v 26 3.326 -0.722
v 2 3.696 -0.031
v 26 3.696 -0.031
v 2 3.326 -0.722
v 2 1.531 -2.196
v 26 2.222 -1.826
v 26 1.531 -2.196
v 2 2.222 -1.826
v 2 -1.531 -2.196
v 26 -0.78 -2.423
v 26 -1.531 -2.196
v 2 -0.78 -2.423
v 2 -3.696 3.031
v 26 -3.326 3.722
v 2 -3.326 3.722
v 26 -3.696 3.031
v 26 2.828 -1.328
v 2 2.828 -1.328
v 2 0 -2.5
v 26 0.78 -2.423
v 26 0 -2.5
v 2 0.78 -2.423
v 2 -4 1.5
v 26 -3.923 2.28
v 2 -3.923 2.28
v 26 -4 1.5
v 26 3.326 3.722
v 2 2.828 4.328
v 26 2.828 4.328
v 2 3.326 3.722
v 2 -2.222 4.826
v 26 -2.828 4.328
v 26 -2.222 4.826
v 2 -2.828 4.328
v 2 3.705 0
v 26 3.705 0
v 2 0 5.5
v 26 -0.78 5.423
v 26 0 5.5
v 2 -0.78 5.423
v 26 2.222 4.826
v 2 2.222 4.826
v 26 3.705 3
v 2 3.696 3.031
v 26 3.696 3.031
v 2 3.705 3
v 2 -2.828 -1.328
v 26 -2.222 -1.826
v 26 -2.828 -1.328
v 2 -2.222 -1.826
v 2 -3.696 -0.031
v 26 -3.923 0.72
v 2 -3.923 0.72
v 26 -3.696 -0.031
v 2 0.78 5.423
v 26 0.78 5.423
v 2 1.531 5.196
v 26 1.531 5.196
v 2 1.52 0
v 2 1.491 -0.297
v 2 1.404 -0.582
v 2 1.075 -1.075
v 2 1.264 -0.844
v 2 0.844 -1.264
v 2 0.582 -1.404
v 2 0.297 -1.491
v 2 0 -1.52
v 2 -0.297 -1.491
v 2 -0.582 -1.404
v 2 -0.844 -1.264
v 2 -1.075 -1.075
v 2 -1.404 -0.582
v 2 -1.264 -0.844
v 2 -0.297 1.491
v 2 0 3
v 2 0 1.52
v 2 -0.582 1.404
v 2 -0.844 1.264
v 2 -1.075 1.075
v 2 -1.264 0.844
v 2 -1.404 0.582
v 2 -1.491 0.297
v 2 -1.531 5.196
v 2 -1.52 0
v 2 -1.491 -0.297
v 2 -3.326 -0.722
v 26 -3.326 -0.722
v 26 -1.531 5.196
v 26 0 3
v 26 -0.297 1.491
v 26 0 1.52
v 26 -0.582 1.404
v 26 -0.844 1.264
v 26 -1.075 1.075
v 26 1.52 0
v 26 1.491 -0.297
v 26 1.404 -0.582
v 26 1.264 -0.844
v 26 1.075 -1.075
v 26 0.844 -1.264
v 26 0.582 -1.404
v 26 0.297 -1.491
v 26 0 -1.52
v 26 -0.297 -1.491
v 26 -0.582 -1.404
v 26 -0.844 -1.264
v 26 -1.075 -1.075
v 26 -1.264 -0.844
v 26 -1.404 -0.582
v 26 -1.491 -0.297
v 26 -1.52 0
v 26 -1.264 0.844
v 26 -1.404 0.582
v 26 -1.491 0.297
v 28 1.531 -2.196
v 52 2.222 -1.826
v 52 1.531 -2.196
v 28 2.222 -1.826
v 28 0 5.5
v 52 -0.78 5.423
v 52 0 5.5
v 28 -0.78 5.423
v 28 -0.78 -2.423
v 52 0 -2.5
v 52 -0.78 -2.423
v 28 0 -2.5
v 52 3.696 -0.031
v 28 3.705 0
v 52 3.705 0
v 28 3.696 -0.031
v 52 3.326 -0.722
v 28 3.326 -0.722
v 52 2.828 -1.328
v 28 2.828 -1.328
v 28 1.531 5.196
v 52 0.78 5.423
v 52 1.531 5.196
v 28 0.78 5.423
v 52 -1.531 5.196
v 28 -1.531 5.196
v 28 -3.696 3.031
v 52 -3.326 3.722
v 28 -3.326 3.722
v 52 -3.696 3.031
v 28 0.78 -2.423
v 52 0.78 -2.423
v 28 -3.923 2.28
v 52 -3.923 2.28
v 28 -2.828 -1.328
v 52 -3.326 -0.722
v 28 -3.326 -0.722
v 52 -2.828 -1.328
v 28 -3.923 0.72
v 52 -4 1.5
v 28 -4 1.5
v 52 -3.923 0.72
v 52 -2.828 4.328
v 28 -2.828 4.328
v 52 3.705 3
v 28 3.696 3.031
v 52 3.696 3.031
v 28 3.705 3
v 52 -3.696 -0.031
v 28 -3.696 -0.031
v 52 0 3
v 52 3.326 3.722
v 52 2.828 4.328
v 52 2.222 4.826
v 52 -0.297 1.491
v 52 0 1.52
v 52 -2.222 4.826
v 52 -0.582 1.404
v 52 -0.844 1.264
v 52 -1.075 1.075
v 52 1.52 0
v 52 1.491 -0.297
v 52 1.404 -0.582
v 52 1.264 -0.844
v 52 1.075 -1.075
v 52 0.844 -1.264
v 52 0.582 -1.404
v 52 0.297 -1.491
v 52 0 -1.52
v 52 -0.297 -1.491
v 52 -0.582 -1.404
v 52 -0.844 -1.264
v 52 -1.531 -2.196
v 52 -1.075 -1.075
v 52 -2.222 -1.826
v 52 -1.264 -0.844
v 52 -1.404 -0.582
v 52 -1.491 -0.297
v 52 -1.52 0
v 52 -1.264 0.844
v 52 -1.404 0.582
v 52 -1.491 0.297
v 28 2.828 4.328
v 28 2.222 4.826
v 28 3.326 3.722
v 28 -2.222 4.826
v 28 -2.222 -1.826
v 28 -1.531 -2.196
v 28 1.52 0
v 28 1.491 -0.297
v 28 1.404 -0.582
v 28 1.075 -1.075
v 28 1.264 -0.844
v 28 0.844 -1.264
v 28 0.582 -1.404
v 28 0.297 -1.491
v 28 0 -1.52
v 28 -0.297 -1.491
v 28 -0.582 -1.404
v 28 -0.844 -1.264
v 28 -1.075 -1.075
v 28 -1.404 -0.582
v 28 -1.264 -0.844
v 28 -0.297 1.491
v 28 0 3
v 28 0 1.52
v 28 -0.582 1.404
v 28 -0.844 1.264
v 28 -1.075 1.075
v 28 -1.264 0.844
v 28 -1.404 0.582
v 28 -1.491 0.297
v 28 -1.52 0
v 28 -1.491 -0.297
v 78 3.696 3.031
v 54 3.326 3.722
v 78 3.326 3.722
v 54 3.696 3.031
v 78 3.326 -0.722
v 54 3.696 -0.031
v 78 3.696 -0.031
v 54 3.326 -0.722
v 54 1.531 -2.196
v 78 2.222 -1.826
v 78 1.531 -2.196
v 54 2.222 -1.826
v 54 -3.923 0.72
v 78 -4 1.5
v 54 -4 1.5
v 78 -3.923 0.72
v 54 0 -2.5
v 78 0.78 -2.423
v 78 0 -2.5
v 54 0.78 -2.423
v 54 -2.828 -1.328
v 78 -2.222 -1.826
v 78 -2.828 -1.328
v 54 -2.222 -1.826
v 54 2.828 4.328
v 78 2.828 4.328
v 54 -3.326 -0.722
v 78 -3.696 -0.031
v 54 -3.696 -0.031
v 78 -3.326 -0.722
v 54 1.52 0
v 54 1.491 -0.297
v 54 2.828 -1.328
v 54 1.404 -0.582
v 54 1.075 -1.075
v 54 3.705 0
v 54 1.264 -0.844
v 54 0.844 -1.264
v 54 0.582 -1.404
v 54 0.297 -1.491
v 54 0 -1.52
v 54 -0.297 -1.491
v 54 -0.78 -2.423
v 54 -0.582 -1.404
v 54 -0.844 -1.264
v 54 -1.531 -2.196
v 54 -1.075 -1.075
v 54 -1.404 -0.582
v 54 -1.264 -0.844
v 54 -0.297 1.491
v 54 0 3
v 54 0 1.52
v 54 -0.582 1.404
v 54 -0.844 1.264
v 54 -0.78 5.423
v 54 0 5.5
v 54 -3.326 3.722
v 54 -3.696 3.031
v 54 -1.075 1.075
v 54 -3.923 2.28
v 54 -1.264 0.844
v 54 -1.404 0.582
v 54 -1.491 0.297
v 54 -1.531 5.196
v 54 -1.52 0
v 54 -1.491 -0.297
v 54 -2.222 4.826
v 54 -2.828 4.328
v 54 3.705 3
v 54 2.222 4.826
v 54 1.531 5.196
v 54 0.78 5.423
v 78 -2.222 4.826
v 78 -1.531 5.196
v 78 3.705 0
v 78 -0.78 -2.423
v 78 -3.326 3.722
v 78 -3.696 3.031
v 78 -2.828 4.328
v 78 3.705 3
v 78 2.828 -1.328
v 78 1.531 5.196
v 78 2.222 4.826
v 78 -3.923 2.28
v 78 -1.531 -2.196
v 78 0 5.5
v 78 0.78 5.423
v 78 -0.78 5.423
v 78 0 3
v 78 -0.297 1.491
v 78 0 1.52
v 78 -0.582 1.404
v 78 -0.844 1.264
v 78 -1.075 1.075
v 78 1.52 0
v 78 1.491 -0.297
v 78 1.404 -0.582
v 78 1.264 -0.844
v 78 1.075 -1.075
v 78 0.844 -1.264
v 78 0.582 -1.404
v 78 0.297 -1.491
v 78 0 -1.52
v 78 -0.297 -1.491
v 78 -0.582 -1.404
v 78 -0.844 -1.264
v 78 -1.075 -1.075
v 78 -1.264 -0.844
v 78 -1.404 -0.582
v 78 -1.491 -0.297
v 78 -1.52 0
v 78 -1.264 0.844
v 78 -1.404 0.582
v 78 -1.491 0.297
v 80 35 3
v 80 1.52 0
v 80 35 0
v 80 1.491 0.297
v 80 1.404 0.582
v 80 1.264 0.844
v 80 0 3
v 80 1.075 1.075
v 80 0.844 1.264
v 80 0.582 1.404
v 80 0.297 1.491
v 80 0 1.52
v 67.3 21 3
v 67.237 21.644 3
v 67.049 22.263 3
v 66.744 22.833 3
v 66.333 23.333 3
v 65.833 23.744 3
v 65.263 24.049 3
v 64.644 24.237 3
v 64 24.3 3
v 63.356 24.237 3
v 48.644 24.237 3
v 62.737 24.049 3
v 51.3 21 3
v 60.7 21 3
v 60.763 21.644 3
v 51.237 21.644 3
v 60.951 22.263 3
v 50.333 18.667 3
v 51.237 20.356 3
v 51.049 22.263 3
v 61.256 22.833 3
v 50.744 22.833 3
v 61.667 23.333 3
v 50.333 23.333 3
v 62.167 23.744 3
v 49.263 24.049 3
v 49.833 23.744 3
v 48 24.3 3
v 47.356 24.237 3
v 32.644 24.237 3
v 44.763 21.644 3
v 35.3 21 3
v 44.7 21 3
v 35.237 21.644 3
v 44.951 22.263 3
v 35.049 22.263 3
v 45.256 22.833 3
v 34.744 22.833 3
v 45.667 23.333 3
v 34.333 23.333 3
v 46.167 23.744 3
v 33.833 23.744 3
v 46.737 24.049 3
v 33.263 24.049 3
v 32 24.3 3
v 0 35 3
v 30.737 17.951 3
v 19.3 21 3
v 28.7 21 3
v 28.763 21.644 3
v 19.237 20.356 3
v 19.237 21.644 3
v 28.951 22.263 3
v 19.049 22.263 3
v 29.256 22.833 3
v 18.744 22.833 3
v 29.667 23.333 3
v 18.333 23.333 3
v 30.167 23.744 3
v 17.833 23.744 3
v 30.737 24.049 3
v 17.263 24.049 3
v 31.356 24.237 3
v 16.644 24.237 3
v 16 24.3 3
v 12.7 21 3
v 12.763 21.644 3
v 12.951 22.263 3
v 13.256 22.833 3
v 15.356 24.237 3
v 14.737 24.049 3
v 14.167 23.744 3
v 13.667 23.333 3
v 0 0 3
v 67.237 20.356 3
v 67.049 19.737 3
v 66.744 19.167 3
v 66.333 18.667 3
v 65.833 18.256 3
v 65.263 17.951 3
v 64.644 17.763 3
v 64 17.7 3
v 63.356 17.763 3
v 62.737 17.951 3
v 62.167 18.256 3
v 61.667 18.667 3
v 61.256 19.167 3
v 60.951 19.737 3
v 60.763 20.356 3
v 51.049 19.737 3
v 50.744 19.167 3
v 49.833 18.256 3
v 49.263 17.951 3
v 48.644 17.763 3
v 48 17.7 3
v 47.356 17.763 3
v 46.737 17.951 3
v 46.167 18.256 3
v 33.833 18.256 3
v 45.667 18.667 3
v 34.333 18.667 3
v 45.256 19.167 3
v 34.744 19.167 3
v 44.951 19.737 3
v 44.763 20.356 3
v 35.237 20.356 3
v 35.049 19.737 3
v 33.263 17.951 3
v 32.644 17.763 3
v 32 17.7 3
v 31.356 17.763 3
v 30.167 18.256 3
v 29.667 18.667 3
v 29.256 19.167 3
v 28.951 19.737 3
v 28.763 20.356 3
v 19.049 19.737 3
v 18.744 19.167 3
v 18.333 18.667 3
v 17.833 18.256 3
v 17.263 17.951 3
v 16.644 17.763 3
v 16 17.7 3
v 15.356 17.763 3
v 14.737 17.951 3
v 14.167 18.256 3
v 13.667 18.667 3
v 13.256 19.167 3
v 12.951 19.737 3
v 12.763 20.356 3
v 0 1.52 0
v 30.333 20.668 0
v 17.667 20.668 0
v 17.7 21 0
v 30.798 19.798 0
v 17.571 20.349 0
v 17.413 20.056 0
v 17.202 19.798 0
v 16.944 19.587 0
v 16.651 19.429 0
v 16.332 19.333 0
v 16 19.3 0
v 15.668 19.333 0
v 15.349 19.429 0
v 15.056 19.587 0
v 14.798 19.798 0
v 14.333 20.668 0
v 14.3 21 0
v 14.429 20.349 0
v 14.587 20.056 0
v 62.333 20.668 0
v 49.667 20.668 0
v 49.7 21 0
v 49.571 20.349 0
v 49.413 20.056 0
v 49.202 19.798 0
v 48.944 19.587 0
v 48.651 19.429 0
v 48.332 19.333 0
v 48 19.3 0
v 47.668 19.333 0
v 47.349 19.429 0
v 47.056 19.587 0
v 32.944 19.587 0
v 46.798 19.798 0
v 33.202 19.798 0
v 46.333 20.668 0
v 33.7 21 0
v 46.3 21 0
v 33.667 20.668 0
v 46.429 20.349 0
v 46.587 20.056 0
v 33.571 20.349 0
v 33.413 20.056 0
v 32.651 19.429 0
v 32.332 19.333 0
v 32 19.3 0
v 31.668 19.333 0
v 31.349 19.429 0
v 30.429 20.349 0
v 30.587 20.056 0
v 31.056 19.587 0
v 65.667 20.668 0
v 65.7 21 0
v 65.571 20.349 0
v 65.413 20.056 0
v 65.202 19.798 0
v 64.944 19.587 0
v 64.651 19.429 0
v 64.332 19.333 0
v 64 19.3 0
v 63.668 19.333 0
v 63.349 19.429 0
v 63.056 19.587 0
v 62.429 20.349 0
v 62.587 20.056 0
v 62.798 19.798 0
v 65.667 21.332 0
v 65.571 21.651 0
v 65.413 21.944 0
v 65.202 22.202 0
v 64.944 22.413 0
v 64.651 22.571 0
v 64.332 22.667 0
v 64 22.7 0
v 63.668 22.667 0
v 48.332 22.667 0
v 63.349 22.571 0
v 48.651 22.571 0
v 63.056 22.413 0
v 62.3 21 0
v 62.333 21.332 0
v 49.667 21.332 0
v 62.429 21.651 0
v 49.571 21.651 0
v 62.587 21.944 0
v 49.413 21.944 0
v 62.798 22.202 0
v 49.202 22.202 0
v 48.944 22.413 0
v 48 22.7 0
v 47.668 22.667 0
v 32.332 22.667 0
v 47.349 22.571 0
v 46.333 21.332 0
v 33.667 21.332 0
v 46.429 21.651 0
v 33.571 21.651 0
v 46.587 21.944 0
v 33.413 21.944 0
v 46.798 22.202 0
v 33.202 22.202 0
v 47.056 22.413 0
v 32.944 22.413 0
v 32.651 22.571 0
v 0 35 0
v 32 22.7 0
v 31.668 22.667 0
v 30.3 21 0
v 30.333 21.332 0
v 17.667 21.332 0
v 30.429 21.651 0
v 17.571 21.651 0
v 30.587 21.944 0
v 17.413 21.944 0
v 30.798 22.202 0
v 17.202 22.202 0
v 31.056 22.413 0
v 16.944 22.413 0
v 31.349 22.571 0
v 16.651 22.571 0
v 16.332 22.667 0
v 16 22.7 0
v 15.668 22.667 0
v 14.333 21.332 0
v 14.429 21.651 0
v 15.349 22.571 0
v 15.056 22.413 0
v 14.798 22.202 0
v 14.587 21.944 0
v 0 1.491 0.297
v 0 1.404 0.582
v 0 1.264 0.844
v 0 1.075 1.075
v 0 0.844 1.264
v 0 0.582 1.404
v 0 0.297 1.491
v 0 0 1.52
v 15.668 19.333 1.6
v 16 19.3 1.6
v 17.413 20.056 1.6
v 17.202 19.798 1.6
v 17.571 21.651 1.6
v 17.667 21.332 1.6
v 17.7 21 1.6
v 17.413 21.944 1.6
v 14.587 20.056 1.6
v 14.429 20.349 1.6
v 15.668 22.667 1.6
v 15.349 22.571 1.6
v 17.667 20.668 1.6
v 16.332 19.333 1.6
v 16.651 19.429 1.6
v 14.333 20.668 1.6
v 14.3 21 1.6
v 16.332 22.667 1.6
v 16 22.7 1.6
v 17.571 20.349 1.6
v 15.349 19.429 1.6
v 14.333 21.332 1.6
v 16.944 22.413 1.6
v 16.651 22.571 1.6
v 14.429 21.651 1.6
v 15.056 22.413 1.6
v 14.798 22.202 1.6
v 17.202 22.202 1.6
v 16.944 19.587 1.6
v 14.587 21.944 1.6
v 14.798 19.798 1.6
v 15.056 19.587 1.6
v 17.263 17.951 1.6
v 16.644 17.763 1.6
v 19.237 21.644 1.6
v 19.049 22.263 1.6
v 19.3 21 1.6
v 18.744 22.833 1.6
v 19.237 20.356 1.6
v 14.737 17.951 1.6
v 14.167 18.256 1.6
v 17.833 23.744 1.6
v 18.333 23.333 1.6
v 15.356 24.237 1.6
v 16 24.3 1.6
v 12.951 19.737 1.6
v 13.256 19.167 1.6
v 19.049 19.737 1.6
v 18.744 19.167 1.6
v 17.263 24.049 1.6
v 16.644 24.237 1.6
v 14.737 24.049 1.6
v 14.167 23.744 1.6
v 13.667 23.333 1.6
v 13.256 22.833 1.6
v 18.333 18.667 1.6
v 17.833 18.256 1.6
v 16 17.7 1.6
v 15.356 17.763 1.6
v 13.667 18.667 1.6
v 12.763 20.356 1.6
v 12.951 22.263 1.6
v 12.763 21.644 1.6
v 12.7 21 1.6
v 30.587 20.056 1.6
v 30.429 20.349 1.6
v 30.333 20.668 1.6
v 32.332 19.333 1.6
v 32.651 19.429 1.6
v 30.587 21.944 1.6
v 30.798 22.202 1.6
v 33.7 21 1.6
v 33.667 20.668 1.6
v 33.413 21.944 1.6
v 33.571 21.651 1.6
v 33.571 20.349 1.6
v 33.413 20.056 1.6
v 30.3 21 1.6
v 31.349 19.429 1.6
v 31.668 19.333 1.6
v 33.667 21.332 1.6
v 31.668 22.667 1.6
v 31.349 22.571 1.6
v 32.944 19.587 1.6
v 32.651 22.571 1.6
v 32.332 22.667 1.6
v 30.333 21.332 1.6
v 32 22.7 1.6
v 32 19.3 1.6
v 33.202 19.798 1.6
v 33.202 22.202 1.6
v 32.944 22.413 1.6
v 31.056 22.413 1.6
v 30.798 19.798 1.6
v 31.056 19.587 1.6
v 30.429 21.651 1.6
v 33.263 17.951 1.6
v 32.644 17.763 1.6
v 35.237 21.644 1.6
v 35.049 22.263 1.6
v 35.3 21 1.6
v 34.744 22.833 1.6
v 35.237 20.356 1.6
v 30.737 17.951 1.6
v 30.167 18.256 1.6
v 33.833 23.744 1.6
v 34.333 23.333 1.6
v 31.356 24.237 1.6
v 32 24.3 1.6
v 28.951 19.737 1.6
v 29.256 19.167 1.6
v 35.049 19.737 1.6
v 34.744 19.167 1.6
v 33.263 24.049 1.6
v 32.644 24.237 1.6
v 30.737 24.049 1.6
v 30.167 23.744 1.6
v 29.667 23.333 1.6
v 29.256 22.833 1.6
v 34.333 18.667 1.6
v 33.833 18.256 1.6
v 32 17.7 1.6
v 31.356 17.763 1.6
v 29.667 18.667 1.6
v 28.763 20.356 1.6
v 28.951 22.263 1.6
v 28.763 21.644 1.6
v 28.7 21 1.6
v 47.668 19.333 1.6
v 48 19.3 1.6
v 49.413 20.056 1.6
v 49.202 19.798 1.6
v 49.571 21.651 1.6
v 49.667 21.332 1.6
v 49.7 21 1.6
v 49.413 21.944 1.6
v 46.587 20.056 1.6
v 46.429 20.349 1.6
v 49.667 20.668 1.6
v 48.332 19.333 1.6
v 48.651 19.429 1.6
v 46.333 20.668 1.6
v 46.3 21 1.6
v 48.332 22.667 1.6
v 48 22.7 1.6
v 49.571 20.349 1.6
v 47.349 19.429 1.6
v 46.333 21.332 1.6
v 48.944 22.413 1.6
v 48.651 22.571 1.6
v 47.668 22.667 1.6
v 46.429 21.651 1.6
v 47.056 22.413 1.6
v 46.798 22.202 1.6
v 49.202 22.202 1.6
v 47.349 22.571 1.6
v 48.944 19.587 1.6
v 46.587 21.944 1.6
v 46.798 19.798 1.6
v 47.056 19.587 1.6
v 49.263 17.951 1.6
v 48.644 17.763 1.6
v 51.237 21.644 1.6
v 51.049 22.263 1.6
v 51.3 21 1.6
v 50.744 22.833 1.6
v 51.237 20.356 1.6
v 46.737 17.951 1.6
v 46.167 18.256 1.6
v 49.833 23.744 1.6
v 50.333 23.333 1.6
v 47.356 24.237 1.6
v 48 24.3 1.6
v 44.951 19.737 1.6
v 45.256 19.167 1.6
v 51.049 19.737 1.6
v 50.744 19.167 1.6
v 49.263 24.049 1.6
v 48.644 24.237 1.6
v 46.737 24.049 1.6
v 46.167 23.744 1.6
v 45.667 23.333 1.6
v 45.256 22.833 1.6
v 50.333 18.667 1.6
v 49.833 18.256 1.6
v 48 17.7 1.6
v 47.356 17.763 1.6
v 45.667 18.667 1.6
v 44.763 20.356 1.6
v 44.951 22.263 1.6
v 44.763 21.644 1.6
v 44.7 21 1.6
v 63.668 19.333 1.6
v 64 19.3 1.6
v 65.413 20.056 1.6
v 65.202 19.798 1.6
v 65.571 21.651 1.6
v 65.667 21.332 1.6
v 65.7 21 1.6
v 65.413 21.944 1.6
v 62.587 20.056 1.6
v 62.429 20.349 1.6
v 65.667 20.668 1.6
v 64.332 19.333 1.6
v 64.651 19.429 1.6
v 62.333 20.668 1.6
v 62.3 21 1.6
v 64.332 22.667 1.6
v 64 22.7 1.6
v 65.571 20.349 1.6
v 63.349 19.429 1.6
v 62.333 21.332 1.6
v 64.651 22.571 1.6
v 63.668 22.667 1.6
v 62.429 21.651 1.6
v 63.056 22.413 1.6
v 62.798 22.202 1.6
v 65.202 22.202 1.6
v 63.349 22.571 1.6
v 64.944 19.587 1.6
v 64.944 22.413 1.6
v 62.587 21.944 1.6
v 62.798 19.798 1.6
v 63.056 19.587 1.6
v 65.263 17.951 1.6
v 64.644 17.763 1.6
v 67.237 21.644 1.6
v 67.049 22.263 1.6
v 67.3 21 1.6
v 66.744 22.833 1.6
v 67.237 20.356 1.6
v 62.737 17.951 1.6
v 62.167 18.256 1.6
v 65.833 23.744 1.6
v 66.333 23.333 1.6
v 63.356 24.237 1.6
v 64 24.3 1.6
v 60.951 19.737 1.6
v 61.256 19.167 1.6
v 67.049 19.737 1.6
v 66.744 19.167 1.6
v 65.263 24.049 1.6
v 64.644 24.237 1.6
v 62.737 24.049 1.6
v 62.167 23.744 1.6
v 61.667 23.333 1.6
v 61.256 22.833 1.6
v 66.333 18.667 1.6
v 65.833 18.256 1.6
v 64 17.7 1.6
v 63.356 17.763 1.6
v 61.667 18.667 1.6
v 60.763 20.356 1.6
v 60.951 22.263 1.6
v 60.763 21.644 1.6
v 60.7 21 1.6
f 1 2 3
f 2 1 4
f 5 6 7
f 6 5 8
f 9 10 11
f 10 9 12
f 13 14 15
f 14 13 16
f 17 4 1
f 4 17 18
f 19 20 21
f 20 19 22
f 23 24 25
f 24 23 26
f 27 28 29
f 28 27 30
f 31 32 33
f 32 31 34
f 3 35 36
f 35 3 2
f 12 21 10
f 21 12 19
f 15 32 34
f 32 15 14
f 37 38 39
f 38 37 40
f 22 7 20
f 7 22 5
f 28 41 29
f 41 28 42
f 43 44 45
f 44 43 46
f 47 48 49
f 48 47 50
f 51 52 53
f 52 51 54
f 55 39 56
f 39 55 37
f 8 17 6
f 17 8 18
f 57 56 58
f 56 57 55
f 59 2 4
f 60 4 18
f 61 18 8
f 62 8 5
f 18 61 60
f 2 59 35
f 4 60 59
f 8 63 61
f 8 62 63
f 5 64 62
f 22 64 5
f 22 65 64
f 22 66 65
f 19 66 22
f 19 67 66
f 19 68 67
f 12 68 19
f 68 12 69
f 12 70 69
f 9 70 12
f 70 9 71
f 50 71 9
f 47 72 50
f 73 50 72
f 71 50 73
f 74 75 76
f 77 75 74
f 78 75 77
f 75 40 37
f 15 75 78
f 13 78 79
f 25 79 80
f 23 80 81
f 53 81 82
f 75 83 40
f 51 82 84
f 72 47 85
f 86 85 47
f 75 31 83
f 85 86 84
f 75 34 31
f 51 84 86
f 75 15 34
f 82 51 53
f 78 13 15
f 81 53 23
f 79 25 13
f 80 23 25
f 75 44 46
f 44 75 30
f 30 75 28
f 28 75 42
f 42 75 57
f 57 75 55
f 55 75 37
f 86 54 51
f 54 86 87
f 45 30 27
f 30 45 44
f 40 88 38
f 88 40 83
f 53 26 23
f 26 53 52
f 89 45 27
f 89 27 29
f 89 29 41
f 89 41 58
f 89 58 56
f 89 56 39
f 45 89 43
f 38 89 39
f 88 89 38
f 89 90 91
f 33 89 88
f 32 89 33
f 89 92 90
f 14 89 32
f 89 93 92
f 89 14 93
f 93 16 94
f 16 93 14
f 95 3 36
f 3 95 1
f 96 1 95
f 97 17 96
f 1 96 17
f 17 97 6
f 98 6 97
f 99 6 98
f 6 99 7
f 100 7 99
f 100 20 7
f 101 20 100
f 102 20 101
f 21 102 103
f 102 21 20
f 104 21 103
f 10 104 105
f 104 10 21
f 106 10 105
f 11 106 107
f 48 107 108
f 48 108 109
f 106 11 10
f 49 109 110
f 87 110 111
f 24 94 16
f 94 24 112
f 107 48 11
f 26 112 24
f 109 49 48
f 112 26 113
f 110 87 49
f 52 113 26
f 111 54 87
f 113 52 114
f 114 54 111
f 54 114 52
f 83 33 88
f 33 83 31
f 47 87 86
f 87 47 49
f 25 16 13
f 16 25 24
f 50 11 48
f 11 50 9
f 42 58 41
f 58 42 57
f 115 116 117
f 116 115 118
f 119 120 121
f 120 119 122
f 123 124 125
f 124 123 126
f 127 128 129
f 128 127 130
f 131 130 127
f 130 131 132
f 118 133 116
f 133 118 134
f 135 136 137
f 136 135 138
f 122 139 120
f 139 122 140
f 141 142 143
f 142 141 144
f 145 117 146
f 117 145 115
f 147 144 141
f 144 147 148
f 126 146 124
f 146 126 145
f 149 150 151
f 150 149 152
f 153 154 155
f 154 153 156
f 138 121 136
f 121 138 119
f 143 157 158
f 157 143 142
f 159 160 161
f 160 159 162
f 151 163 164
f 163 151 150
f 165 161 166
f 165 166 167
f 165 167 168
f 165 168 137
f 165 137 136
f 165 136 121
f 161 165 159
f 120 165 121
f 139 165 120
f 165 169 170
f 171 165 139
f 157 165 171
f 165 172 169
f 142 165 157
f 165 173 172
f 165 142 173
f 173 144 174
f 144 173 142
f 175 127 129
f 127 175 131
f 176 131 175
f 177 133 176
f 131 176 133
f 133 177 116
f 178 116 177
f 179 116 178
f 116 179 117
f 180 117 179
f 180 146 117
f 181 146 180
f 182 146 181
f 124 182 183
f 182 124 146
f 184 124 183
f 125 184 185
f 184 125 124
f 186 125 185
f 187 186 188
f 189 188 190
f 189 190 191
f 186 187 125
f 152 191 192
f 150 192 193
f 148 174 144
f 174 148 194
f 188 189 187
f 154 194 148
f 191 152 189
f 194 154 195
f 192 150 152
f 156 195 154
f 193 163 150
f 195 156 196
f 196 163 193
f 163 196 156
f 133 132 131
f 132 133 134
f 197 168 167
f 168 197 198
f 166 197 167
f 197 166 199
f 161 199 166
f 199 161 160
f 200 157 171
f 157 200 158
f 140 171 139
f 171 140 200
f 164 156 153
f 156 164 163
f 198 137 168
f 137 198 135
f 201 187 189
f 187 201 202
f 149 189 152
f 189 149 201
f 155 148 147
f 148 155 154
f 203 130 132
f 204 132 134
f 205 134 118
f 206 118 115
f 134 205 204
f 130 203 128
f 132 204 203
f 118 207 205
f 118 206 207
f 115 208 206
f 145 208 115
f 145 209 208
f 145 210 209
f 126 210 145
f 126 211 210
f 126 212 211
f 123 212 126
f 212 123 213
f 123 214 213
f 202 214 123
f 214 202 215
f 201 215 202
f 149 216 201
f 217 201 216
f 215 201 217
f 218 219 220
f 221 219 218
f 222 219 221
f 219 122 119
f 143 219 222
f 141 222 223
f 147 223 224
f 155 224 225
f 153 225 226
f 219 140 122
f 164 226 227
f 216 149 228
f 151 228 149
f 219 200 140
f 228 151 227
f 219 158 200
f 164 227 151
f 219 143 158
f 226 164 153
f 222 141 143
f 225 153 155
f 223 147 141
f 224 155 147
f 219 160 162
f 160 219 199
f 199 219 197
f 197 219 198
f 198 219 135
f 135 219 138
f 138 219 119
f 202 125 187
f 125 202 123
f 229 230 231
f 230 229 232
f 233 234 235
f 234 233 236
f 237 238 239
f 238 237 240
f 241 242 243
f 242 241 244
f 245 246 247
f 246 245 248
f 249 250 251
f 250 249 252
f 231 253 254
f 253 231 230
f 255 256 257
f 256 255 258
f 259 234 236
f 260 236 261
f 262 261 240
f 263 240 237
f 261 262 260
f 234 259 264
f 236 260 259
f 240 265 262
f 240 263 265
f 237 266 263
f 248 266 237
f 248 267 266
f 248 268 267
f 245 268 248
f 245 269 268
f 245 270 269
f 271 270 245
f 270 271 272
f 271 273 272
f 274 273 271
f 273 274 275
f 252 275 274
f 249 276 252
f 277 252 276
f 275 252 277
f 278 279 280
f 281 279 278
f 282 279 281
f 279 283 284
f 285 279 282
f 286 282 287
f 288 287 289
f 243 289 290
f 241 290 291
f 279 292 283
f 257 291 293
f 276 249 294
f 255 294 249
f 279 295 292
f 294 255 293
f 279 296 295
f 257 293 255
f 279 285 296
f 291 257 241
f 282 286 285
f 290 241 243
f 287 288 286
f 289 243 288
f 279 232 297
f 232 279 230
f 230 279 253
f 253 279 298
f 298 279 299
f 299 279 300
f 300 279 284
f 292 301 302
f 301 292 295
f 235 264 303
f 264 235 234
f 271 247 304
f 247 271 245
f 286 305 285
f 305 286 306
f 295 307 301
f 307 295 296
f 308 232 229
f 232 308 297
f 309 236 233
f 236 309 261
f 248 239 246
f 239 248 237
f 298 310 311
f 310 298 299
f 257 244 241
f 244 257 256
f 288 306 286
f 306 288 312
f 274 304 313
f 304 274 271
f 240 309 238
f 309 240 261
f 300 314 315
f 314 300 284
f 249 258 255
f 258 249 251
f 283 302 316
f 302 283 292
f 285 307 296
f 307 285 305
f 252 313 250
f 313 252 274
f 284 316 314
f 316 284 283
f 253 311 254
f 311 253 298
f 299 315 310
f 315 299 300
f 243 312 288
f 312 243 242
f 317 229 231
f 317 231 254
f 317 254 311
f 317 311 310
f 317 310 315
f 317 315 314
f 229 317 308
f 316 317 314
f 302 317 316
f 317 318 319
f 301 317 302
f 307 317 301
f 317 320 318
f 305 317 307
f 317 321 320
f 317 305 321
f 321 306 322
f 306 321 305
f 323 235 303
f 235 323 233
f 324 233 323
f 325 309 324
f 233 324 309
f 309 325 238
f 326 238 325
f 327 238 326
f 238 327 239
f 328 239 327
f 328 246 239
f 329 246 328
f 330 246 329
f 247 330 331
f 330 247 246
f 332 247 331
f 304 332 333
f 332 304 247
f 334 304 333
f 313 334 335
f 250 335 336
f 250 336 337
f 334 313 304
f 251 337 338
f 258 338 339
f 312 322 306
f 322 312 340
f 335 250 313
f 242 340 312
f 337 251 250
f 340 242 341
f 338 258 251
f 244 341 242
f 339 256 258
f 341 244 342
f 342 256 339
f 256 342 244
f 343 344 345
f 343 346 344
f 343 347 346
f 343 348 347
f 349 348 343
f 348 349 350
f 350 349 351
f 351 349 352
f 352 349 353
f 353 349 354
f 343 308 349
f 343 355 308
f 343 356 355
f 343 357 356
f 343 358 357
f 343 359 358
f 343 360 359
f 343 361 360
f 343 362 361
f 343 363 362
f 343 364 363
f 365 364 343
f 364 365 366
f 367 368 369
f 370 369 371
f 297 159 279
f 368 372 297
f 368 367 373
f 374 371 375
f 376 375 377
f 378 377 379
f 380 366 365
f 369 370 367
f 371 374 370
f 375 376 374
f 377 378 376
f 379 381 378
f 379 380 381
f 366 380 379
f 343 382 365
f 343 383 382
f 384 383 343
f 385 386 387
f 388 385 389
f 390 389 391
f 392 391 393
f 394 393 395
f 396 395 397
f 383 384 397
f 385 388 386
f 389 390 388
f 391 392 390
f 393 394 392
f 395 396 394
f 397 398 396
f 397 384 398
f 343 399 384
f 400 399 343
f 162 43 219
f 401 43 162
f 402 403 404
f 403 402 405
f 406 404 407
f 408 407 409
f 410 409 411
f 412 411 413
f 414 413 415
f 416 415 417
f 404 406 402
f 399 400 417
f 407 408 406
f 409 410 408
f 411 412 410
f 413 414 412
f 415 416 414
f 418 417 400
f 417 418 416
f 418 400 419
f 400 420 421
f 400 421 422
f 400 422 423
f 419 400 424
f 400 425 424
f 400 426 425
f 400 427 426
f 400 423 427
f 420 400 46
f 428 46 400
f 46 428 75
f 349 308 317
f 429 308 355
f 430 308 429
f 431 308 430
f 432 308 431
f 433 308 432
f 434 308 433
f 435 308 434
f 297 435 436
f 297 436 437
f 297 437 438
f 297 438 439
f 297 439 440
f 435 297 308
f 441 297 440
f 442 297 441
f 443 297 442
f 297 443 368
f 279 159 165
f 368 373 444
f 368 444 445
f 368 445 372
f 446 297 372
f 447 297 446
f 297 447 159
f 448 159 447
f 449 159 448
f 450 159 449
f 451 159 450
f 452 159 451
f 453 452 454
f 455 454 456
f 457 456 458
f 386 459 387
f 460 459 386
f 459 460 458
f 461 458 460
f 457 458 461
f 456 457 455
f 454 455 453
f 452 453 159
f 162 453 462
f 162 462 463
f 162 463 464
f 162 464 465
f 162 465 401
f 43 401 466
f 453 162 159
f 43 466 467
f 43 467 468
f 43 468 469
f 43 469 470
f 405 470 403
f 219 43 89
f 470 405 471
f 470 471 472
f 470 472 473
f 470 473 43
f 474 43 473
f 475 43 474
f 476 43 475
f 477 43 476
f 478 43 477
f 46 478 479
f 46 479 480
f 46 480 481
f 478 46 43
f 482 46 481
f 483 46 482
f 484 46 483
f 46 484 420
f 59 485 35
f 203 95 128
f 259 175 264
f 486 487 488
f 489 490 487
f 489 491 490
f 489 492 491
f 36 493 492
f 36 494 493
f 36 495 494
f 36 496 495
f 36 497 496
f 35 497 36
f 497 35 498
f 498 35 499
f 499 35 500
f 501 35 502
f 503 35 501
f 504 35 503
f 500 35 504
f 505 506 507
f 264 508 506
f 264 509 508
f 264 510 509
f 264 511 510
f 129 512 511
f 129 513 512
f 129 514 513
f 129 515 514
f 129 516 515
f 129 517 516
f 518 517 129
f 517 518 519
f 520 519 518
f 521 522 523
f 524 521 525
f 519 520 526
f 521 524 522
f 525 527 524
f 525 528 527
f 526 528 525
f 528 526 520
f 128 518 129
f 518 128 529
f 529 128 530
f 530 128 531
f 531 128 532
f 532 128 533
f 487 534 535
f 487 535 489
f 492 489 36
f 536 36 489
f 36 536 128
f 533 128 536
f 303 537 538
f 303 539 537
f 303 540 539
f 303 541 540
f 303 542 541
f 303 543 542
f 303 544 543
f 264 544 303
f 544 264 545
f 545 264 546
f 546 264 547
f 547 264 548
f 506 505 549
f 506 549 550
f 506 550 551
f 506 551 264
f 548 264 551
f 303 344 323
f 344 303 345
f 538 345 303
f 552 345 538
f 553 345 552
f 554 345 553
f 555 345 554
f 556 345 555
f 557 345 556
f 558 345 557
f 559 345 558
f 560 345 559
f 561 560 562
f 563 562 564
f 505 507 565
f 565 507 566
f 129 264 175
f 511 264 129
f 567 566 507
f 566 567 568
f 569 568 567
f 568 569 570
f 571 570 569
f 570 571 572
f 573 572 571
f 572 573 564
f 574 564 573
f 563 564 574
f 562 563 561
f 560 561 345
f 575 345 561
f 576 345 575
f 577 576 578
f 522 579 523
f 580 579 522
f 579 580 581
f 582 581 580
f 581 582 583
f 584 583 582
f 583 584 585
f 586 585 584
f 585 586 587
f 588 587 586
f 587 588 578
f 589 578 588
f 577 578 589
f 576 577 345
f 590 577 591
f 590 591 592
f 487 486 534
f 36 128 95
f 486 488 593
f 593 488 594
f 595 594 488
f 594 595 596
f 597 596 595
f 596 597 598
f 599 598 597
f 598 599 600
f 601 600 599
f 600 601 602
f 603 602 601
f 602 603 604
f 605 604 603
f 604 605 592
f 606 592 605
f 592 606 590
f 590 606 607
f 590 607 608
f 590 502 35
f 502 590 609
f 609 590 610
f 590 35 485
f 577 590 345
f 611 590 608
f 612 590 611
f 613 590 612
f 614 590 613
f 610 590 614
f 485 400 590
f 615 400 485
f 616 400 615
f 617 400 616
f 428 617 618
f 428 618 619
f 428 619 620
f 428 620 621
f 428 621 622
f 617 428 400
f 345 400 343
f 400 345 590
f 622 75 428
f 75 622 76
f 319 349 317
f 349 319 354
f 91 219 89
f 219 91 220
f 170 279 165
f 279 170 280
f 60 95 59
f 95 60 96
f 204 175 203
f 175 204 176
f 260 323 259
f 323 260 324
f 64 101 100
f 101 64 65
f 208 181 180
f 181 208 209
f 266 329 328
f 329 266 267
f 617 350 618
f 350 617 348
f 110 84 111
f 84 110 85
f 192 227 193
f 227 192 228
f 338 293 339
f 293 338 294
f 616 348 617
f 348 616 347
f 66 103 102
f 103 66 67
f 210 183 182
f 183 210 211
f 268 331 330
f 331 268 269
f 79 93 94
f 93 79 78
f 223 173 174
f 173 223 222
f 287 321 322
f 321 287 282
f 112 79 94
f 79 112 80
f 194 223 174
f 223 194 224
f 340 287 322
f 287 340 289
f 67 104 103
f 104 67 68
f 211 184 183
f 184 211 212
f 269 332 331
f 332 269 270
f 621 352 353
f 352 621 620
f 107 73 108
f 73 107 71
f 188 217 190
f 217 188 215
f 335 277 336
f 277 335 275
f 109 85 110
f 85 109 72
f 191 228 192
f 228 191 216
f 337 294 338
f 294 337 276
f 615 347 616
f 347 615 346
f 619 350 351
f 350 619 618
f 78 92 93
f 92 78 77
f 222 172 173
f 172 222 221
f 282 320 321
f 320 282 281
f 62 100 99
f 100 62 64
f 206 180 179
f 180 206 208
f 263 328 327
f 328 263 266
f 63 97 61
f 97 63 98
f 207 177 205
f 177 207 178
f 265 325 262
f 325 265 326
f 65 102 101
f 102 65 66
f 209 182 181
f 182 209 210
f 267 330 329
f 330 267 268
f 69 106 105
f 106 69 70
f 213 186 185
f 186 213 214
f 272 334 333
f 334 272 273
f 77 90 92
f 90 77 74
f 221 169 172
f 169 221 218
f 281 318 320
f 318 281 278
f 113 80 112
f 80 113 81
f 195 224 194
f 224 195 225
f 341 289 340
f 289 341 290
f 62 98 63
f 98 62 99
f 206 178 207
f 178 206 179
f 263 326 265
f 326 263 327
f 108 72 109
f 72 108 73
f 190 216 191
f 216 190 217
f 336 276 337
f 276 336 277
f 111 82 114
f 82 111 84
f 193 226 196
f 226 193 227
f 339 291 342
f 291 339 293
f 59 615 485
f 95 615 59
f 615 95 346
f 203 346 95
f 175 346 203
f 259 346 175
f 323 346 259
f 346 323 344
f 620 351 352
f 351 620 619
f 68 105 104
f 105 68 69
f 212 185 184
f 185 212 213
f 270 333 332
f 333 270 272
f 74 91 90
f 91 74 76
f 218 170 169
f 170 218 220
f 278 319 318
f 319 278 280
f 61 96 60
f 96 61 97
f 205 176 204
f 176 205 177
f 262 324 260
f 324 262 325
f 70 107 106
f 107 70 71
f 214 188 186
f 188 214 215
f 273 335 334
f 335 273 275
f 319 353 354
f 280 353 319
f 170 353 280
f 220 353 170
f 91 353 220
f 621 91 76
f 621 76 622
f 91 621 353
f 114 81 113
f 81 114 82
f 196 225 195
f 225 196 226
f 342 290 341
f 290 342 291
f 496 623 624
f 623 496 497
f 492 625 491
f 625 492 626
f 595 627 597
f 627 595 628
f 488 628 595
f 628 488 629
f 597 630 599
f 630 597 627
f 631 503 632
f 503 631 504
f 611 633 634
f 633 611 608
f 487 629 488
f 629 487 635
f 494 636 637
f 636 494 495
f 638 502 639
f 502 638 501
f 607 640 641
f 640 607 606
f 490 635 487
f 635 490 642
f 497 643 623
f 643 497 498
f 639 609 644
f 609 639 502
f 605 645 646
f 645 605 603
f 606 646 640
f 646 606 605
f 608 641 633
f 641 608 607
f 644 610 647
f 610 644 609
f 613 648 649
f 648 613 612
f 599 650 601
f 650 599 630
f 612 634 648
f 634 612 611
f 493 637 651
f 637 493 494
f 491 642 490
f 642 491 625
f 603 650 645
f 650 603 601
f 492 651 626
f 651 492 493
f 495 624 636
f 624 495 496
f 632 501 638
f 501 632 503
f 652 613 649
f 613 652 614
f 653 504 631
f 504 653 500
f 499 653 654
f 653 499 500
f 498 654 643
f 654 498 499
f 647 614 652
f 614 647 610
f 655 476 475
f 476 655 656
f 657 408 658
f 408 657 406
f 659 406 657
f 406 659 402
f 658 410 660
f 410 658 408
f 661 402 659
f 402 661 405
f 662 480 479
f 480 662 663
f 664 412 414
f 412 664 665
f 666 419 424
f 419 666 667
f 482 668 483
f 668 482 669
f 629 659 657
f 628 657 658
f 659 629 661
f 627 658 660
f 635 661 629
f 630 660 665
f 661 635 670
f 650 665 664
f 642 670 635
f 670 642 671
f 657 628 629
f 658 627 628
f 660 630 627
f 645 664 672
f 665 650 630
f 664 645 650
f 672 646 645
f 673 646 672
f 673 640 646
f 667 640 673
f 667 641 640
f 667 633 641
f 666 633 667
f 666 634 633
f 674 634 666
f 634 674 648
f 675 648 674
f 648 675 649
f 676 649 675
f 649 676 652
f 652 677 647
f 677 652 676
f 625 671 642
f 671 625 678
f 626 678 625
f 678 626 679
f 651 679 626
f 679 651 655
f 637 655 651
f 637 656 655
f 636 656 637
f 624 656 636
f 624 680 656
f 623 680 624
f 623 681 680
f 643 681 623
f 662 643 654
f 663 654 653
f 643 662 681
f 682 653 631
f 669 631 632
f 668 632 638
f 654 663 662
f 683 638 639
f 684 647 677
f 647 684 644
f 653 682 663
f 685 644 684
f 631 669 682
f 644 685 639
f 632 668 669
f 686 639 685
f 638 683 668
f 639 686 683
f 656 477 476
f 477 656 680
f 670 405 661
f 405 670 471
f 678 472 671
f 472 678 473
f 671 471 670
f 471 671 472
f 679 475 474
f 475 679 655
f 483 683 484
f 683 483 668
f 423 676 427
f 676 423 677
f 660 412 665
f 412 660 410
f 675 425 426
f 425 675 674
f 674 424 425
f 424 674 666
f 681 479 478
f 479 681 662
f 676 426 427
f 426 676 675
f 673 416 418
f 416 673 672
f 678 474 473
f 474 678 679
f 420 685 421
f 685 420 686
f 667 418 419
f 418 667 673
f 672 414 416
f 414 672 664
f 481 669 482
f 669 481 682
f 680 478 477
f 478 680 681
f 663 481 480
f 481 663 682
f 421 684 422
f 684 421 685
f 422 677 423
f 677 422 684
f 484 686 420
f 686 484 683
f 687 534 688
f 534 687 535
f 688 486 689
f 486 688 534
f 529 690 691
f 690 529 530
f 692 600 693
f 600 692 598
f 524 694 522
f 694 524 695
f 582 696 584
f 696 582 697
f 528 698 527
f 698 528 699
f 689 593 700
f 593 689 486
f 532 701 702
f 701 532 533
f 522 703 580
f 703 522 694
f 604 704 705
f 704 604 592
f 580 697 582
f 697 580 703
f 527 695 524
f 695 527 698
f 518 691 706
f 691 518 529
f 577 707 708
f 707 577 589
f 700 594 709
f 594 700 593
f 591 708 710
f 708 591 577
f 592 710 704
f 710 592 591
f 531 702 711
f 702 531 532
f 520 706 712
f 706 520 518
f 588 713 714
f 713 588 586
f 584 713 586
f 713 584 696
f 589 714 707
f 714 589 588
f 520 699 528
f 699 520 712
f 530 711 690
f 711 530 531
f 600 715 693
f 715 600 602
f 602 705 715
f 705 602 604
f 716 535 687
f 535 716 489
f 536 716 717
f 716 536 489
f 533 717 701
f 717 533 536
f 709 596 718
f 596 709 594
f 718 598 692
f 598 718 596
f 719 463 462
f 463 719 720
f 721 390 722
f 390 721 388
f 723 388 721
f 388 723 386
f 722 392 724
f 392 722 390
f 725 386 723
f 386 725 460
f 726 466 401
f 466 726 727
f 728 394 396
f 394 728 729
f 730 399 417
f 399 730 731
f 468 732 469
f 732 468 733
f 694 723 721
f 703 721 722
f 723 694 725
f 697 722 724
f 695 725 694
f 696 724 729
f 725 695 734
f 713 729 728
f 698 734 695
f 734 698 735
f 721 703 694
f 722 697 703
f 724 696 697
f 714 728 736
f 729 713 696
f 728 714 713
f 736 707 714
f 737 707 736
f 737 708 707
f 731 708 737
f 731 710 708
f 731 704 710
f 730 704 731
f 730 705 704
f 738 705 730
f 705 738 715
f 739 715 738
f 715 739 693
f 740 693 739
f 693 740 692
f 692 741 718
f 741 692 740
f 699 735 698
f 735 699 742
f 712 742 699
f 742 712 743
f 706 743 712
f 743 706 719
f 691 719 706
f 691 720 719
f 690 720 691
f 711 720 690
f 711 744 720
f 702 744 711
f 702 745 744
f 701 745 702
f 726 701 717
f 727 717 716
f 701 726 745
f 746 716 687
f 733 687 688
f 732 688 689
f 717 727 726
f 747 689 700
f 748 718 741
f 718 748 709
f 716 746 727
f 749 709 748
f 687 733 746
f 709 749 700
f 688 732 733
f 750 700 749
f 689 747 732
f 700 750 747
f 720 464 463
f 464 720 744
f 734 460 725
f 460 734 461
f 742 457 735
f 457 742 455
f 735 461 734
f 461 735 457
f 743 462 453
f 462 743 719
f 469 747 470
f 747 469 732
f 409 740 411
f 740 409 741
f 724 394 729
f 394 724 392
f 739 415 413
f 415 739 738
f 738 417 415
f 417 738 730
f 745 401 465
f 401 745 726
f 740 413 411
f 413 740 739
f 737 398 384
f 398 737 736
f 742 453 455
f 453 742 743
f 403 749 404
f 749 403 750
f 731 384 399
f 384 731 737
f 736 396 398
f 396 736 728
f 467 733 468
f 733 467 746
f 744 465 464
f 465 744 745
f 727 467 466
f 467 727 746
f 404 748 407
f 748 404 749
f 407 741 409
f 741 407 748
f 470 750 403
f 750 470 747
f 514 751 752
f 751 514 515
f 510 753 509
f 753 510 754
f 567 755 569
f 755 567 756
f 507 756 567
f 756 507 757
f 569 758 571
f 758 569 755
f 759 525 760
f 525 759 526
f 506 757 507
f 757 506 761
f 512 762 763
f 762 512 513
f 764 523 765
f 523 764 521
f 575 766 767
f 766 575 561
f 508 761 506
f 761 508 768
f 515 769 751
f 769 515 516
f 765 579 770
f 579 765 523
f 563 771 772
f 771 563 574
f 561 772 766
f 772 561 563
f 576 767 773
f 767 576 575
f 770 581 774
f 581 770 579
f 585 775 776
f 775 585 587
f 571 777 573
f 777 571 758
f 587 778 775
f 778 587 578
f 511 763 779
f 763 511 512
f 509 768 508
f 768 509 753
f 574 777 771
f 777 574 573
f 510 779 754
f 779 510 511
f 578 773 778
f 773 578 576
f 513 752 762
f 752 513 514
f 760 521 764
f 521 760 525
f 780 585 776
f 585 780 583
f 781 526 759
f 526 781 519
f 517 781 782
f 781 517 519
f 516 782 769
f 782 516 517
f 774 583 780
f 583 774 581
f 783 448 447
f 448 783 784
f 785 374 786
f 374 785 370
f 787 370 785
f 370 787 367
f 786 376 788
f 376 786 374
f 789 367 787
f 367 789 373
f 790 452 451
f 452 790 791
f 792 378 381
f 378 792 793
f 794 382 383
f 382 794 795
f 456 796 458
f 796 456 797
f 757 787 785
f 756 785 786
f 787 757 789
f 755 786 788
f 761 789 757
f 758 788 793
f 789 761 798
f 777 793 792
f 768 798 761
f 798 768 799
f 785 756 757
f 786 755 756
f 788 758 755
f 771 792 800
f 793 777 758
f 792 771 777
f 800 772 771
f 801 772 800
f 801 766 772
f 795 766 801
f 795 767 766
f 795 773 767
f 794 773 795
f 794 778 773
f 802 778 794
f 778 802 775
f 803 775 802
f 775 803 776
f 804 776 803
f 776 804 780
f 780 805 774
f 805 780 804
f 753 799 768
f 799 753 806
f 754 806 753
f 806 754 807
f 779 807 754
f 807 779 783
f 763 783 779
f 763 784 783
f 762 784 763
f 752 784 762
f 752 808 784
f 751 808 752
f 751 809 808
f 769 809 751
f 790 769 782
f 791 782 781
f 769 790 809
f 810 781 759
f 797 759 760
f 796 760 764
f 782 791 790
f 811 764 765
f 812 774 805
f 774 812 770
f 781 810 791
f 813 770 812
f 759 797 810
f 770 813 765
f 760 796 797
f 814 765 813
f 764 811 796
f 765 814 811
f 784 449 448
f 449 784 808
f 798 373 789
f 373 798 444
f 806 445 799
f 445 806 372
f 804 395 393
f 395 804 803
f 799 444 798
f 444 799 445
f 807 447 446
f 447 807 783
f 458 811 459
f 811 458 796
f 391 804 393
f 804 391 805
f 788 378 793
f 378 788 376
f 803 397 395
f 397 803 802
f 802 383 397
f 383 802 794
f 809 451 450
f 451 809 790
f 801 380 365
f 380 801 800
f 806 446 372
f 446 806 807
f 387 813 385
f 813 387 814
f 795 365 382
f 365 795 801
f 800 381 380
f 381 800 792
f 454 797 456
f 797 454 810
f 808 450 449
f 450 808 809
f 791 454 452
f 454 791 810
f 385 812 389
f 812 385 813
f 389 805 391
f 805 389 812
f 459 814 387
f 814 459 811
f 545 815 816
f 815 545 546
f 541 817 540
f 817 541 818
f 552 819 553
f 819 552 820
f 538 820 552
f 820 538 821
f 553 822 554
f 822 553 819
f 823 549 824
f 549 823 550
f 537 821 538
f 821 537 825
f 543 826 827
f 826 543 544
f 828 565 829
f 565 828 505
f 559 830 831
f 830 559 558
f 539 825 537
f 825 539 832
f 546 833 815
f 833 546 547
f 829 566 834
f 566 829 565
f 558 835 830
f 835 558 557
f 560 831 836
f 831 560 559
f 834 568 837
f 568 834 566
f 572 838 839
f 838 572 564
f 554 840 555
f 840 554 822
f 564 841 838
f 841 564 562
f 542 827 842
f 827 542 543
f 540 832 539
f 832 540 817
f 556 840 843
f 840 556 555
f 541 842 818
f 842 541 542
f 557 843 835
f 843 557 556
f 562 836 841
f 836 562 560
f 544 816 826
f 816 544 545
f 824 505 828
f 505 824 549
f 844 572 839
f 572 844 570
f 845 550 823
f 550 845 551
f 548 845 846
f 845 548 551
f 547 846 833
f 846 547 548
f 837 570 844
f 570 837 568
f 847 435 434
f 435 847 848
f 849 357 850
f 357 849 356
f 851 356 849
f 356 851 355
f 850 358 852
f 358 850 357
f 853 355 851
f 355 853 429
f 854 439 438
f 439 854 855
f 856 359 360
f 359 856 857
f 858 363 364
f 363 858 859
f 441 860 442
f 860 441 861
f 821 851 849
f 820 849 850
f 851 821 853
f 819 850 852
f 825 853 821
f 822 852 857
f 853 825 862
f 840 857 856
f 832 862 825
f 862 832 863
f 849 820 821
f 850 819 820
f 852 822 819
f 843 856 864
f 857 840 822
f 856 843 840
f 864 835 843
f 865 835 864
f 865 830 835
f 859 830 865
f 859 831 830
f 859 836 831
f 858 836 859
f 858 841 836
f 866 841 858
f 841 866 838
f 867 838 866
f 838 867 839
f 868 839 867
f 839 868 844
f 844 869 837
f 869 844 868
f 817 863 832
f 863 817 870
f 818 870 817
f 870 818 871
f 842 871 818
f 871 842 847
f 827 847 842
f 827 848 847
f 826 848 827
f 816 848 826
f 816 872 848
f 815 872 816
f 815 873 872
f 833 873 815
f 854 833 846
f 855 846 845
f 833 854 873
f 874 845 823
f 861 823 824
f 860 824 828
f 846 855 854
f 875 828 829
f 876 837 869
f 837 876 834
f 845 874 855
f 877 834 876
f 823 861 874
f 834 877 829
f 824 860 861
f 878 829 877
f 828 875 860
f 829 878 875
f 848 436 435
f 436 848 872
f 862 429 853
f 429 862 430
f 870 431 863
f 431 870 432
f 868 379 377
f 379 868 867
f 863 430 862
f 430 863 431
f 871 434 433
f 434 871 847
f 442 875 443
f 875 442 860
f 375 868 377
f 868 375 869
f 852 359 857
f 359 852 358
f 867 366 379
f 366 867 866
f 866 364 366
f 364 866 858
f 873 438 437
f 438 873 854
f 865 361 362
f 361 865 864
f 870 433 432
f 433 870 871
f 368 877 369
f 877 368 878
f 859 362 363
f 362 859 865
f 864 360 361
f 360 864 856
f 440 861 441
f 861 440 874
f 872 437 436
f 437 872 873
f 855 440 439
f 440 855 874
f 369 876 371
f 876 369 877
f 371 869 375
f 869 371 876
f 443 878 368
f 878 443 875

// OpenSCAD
$fn = 32;

// ----------------------------------------------------------------------
// Hinge leaf: 80 x 39 x 8 mm
// ----------------------------------------------------------------------

// --- parameters (mm) ---
leaf_len = 80;            // leaf length, X
leaf_w = 35;              // leaf width, Y
leaf_t = 3;               // leaf thickness
knuckle_d = 8;            // knuckle diameter
knuckle_w = 24;           // knuckle width
knuckle_n = 3;            // number of knuckles
pin_d = 3.04;             // pin bore
gap = 2;                  // gap between the knuckles
screw_d = 3.4;            // screw clearance
cs_d = 6.6;               // countersink diameter
cs_h = 1.4;               // countersink depth

module leaf() {
  cube([leaf_len, leaf_w, leaf_t]);
}

module knuckles() {
  /* barrels sit on the leaf edge, the pin axis at half the leaf thickness */
  for (i = [0 : knuckle_n - 1])
    translate([gap + i * (knuckle_w + gap), 0, leaf_t * 0.5])
      rotate([0, 90, 0]) cylinder(h = knuckle_w, d = knuckle_d);
}

difference() {
  union() {
    leaf();
    knuckles();
  }
  rotate([0, 90, 0]) translate([0, 0, -1])
    cylinder(h = leaf_len + 2, d = pin_d);
  translate([16, leaf_w * 0.6, -1]) cylinder(h = leaf_t + 2, d = screw_d);
  translate([16, leaf_w * 0.6, leaf_t - cs_h]) cylinder(h = cs_h + 0.5, d = cs_d);
  translate([32, leaf_w * 0.6, -1]) cylinder(h = leaf_t + 2, d = screw_d);
  translate([32, leaf_w * 0.6, leaf_t - cs_h]) cylinder(h = cs_h + 0.5, d = cs_d);
  translate([48, leaf_w * 0.6, -1]) cylinder(h = leaf_t + 2, d = screw_d);
  translate([48, leaf_w * 0.6, leaf_t - cs_h]) cylinder(h = cs_h + 0.5, d = cs_d);
  translate([64, leaf_w * 0.6, -1]) cylinder(h = leaf_t + 2, d = screw_d);
  translate([64, leaf_w * 0.6, leaf_t - cs_h]) cylinder(h = cs_h + 0.5, d = cs_d);
}
